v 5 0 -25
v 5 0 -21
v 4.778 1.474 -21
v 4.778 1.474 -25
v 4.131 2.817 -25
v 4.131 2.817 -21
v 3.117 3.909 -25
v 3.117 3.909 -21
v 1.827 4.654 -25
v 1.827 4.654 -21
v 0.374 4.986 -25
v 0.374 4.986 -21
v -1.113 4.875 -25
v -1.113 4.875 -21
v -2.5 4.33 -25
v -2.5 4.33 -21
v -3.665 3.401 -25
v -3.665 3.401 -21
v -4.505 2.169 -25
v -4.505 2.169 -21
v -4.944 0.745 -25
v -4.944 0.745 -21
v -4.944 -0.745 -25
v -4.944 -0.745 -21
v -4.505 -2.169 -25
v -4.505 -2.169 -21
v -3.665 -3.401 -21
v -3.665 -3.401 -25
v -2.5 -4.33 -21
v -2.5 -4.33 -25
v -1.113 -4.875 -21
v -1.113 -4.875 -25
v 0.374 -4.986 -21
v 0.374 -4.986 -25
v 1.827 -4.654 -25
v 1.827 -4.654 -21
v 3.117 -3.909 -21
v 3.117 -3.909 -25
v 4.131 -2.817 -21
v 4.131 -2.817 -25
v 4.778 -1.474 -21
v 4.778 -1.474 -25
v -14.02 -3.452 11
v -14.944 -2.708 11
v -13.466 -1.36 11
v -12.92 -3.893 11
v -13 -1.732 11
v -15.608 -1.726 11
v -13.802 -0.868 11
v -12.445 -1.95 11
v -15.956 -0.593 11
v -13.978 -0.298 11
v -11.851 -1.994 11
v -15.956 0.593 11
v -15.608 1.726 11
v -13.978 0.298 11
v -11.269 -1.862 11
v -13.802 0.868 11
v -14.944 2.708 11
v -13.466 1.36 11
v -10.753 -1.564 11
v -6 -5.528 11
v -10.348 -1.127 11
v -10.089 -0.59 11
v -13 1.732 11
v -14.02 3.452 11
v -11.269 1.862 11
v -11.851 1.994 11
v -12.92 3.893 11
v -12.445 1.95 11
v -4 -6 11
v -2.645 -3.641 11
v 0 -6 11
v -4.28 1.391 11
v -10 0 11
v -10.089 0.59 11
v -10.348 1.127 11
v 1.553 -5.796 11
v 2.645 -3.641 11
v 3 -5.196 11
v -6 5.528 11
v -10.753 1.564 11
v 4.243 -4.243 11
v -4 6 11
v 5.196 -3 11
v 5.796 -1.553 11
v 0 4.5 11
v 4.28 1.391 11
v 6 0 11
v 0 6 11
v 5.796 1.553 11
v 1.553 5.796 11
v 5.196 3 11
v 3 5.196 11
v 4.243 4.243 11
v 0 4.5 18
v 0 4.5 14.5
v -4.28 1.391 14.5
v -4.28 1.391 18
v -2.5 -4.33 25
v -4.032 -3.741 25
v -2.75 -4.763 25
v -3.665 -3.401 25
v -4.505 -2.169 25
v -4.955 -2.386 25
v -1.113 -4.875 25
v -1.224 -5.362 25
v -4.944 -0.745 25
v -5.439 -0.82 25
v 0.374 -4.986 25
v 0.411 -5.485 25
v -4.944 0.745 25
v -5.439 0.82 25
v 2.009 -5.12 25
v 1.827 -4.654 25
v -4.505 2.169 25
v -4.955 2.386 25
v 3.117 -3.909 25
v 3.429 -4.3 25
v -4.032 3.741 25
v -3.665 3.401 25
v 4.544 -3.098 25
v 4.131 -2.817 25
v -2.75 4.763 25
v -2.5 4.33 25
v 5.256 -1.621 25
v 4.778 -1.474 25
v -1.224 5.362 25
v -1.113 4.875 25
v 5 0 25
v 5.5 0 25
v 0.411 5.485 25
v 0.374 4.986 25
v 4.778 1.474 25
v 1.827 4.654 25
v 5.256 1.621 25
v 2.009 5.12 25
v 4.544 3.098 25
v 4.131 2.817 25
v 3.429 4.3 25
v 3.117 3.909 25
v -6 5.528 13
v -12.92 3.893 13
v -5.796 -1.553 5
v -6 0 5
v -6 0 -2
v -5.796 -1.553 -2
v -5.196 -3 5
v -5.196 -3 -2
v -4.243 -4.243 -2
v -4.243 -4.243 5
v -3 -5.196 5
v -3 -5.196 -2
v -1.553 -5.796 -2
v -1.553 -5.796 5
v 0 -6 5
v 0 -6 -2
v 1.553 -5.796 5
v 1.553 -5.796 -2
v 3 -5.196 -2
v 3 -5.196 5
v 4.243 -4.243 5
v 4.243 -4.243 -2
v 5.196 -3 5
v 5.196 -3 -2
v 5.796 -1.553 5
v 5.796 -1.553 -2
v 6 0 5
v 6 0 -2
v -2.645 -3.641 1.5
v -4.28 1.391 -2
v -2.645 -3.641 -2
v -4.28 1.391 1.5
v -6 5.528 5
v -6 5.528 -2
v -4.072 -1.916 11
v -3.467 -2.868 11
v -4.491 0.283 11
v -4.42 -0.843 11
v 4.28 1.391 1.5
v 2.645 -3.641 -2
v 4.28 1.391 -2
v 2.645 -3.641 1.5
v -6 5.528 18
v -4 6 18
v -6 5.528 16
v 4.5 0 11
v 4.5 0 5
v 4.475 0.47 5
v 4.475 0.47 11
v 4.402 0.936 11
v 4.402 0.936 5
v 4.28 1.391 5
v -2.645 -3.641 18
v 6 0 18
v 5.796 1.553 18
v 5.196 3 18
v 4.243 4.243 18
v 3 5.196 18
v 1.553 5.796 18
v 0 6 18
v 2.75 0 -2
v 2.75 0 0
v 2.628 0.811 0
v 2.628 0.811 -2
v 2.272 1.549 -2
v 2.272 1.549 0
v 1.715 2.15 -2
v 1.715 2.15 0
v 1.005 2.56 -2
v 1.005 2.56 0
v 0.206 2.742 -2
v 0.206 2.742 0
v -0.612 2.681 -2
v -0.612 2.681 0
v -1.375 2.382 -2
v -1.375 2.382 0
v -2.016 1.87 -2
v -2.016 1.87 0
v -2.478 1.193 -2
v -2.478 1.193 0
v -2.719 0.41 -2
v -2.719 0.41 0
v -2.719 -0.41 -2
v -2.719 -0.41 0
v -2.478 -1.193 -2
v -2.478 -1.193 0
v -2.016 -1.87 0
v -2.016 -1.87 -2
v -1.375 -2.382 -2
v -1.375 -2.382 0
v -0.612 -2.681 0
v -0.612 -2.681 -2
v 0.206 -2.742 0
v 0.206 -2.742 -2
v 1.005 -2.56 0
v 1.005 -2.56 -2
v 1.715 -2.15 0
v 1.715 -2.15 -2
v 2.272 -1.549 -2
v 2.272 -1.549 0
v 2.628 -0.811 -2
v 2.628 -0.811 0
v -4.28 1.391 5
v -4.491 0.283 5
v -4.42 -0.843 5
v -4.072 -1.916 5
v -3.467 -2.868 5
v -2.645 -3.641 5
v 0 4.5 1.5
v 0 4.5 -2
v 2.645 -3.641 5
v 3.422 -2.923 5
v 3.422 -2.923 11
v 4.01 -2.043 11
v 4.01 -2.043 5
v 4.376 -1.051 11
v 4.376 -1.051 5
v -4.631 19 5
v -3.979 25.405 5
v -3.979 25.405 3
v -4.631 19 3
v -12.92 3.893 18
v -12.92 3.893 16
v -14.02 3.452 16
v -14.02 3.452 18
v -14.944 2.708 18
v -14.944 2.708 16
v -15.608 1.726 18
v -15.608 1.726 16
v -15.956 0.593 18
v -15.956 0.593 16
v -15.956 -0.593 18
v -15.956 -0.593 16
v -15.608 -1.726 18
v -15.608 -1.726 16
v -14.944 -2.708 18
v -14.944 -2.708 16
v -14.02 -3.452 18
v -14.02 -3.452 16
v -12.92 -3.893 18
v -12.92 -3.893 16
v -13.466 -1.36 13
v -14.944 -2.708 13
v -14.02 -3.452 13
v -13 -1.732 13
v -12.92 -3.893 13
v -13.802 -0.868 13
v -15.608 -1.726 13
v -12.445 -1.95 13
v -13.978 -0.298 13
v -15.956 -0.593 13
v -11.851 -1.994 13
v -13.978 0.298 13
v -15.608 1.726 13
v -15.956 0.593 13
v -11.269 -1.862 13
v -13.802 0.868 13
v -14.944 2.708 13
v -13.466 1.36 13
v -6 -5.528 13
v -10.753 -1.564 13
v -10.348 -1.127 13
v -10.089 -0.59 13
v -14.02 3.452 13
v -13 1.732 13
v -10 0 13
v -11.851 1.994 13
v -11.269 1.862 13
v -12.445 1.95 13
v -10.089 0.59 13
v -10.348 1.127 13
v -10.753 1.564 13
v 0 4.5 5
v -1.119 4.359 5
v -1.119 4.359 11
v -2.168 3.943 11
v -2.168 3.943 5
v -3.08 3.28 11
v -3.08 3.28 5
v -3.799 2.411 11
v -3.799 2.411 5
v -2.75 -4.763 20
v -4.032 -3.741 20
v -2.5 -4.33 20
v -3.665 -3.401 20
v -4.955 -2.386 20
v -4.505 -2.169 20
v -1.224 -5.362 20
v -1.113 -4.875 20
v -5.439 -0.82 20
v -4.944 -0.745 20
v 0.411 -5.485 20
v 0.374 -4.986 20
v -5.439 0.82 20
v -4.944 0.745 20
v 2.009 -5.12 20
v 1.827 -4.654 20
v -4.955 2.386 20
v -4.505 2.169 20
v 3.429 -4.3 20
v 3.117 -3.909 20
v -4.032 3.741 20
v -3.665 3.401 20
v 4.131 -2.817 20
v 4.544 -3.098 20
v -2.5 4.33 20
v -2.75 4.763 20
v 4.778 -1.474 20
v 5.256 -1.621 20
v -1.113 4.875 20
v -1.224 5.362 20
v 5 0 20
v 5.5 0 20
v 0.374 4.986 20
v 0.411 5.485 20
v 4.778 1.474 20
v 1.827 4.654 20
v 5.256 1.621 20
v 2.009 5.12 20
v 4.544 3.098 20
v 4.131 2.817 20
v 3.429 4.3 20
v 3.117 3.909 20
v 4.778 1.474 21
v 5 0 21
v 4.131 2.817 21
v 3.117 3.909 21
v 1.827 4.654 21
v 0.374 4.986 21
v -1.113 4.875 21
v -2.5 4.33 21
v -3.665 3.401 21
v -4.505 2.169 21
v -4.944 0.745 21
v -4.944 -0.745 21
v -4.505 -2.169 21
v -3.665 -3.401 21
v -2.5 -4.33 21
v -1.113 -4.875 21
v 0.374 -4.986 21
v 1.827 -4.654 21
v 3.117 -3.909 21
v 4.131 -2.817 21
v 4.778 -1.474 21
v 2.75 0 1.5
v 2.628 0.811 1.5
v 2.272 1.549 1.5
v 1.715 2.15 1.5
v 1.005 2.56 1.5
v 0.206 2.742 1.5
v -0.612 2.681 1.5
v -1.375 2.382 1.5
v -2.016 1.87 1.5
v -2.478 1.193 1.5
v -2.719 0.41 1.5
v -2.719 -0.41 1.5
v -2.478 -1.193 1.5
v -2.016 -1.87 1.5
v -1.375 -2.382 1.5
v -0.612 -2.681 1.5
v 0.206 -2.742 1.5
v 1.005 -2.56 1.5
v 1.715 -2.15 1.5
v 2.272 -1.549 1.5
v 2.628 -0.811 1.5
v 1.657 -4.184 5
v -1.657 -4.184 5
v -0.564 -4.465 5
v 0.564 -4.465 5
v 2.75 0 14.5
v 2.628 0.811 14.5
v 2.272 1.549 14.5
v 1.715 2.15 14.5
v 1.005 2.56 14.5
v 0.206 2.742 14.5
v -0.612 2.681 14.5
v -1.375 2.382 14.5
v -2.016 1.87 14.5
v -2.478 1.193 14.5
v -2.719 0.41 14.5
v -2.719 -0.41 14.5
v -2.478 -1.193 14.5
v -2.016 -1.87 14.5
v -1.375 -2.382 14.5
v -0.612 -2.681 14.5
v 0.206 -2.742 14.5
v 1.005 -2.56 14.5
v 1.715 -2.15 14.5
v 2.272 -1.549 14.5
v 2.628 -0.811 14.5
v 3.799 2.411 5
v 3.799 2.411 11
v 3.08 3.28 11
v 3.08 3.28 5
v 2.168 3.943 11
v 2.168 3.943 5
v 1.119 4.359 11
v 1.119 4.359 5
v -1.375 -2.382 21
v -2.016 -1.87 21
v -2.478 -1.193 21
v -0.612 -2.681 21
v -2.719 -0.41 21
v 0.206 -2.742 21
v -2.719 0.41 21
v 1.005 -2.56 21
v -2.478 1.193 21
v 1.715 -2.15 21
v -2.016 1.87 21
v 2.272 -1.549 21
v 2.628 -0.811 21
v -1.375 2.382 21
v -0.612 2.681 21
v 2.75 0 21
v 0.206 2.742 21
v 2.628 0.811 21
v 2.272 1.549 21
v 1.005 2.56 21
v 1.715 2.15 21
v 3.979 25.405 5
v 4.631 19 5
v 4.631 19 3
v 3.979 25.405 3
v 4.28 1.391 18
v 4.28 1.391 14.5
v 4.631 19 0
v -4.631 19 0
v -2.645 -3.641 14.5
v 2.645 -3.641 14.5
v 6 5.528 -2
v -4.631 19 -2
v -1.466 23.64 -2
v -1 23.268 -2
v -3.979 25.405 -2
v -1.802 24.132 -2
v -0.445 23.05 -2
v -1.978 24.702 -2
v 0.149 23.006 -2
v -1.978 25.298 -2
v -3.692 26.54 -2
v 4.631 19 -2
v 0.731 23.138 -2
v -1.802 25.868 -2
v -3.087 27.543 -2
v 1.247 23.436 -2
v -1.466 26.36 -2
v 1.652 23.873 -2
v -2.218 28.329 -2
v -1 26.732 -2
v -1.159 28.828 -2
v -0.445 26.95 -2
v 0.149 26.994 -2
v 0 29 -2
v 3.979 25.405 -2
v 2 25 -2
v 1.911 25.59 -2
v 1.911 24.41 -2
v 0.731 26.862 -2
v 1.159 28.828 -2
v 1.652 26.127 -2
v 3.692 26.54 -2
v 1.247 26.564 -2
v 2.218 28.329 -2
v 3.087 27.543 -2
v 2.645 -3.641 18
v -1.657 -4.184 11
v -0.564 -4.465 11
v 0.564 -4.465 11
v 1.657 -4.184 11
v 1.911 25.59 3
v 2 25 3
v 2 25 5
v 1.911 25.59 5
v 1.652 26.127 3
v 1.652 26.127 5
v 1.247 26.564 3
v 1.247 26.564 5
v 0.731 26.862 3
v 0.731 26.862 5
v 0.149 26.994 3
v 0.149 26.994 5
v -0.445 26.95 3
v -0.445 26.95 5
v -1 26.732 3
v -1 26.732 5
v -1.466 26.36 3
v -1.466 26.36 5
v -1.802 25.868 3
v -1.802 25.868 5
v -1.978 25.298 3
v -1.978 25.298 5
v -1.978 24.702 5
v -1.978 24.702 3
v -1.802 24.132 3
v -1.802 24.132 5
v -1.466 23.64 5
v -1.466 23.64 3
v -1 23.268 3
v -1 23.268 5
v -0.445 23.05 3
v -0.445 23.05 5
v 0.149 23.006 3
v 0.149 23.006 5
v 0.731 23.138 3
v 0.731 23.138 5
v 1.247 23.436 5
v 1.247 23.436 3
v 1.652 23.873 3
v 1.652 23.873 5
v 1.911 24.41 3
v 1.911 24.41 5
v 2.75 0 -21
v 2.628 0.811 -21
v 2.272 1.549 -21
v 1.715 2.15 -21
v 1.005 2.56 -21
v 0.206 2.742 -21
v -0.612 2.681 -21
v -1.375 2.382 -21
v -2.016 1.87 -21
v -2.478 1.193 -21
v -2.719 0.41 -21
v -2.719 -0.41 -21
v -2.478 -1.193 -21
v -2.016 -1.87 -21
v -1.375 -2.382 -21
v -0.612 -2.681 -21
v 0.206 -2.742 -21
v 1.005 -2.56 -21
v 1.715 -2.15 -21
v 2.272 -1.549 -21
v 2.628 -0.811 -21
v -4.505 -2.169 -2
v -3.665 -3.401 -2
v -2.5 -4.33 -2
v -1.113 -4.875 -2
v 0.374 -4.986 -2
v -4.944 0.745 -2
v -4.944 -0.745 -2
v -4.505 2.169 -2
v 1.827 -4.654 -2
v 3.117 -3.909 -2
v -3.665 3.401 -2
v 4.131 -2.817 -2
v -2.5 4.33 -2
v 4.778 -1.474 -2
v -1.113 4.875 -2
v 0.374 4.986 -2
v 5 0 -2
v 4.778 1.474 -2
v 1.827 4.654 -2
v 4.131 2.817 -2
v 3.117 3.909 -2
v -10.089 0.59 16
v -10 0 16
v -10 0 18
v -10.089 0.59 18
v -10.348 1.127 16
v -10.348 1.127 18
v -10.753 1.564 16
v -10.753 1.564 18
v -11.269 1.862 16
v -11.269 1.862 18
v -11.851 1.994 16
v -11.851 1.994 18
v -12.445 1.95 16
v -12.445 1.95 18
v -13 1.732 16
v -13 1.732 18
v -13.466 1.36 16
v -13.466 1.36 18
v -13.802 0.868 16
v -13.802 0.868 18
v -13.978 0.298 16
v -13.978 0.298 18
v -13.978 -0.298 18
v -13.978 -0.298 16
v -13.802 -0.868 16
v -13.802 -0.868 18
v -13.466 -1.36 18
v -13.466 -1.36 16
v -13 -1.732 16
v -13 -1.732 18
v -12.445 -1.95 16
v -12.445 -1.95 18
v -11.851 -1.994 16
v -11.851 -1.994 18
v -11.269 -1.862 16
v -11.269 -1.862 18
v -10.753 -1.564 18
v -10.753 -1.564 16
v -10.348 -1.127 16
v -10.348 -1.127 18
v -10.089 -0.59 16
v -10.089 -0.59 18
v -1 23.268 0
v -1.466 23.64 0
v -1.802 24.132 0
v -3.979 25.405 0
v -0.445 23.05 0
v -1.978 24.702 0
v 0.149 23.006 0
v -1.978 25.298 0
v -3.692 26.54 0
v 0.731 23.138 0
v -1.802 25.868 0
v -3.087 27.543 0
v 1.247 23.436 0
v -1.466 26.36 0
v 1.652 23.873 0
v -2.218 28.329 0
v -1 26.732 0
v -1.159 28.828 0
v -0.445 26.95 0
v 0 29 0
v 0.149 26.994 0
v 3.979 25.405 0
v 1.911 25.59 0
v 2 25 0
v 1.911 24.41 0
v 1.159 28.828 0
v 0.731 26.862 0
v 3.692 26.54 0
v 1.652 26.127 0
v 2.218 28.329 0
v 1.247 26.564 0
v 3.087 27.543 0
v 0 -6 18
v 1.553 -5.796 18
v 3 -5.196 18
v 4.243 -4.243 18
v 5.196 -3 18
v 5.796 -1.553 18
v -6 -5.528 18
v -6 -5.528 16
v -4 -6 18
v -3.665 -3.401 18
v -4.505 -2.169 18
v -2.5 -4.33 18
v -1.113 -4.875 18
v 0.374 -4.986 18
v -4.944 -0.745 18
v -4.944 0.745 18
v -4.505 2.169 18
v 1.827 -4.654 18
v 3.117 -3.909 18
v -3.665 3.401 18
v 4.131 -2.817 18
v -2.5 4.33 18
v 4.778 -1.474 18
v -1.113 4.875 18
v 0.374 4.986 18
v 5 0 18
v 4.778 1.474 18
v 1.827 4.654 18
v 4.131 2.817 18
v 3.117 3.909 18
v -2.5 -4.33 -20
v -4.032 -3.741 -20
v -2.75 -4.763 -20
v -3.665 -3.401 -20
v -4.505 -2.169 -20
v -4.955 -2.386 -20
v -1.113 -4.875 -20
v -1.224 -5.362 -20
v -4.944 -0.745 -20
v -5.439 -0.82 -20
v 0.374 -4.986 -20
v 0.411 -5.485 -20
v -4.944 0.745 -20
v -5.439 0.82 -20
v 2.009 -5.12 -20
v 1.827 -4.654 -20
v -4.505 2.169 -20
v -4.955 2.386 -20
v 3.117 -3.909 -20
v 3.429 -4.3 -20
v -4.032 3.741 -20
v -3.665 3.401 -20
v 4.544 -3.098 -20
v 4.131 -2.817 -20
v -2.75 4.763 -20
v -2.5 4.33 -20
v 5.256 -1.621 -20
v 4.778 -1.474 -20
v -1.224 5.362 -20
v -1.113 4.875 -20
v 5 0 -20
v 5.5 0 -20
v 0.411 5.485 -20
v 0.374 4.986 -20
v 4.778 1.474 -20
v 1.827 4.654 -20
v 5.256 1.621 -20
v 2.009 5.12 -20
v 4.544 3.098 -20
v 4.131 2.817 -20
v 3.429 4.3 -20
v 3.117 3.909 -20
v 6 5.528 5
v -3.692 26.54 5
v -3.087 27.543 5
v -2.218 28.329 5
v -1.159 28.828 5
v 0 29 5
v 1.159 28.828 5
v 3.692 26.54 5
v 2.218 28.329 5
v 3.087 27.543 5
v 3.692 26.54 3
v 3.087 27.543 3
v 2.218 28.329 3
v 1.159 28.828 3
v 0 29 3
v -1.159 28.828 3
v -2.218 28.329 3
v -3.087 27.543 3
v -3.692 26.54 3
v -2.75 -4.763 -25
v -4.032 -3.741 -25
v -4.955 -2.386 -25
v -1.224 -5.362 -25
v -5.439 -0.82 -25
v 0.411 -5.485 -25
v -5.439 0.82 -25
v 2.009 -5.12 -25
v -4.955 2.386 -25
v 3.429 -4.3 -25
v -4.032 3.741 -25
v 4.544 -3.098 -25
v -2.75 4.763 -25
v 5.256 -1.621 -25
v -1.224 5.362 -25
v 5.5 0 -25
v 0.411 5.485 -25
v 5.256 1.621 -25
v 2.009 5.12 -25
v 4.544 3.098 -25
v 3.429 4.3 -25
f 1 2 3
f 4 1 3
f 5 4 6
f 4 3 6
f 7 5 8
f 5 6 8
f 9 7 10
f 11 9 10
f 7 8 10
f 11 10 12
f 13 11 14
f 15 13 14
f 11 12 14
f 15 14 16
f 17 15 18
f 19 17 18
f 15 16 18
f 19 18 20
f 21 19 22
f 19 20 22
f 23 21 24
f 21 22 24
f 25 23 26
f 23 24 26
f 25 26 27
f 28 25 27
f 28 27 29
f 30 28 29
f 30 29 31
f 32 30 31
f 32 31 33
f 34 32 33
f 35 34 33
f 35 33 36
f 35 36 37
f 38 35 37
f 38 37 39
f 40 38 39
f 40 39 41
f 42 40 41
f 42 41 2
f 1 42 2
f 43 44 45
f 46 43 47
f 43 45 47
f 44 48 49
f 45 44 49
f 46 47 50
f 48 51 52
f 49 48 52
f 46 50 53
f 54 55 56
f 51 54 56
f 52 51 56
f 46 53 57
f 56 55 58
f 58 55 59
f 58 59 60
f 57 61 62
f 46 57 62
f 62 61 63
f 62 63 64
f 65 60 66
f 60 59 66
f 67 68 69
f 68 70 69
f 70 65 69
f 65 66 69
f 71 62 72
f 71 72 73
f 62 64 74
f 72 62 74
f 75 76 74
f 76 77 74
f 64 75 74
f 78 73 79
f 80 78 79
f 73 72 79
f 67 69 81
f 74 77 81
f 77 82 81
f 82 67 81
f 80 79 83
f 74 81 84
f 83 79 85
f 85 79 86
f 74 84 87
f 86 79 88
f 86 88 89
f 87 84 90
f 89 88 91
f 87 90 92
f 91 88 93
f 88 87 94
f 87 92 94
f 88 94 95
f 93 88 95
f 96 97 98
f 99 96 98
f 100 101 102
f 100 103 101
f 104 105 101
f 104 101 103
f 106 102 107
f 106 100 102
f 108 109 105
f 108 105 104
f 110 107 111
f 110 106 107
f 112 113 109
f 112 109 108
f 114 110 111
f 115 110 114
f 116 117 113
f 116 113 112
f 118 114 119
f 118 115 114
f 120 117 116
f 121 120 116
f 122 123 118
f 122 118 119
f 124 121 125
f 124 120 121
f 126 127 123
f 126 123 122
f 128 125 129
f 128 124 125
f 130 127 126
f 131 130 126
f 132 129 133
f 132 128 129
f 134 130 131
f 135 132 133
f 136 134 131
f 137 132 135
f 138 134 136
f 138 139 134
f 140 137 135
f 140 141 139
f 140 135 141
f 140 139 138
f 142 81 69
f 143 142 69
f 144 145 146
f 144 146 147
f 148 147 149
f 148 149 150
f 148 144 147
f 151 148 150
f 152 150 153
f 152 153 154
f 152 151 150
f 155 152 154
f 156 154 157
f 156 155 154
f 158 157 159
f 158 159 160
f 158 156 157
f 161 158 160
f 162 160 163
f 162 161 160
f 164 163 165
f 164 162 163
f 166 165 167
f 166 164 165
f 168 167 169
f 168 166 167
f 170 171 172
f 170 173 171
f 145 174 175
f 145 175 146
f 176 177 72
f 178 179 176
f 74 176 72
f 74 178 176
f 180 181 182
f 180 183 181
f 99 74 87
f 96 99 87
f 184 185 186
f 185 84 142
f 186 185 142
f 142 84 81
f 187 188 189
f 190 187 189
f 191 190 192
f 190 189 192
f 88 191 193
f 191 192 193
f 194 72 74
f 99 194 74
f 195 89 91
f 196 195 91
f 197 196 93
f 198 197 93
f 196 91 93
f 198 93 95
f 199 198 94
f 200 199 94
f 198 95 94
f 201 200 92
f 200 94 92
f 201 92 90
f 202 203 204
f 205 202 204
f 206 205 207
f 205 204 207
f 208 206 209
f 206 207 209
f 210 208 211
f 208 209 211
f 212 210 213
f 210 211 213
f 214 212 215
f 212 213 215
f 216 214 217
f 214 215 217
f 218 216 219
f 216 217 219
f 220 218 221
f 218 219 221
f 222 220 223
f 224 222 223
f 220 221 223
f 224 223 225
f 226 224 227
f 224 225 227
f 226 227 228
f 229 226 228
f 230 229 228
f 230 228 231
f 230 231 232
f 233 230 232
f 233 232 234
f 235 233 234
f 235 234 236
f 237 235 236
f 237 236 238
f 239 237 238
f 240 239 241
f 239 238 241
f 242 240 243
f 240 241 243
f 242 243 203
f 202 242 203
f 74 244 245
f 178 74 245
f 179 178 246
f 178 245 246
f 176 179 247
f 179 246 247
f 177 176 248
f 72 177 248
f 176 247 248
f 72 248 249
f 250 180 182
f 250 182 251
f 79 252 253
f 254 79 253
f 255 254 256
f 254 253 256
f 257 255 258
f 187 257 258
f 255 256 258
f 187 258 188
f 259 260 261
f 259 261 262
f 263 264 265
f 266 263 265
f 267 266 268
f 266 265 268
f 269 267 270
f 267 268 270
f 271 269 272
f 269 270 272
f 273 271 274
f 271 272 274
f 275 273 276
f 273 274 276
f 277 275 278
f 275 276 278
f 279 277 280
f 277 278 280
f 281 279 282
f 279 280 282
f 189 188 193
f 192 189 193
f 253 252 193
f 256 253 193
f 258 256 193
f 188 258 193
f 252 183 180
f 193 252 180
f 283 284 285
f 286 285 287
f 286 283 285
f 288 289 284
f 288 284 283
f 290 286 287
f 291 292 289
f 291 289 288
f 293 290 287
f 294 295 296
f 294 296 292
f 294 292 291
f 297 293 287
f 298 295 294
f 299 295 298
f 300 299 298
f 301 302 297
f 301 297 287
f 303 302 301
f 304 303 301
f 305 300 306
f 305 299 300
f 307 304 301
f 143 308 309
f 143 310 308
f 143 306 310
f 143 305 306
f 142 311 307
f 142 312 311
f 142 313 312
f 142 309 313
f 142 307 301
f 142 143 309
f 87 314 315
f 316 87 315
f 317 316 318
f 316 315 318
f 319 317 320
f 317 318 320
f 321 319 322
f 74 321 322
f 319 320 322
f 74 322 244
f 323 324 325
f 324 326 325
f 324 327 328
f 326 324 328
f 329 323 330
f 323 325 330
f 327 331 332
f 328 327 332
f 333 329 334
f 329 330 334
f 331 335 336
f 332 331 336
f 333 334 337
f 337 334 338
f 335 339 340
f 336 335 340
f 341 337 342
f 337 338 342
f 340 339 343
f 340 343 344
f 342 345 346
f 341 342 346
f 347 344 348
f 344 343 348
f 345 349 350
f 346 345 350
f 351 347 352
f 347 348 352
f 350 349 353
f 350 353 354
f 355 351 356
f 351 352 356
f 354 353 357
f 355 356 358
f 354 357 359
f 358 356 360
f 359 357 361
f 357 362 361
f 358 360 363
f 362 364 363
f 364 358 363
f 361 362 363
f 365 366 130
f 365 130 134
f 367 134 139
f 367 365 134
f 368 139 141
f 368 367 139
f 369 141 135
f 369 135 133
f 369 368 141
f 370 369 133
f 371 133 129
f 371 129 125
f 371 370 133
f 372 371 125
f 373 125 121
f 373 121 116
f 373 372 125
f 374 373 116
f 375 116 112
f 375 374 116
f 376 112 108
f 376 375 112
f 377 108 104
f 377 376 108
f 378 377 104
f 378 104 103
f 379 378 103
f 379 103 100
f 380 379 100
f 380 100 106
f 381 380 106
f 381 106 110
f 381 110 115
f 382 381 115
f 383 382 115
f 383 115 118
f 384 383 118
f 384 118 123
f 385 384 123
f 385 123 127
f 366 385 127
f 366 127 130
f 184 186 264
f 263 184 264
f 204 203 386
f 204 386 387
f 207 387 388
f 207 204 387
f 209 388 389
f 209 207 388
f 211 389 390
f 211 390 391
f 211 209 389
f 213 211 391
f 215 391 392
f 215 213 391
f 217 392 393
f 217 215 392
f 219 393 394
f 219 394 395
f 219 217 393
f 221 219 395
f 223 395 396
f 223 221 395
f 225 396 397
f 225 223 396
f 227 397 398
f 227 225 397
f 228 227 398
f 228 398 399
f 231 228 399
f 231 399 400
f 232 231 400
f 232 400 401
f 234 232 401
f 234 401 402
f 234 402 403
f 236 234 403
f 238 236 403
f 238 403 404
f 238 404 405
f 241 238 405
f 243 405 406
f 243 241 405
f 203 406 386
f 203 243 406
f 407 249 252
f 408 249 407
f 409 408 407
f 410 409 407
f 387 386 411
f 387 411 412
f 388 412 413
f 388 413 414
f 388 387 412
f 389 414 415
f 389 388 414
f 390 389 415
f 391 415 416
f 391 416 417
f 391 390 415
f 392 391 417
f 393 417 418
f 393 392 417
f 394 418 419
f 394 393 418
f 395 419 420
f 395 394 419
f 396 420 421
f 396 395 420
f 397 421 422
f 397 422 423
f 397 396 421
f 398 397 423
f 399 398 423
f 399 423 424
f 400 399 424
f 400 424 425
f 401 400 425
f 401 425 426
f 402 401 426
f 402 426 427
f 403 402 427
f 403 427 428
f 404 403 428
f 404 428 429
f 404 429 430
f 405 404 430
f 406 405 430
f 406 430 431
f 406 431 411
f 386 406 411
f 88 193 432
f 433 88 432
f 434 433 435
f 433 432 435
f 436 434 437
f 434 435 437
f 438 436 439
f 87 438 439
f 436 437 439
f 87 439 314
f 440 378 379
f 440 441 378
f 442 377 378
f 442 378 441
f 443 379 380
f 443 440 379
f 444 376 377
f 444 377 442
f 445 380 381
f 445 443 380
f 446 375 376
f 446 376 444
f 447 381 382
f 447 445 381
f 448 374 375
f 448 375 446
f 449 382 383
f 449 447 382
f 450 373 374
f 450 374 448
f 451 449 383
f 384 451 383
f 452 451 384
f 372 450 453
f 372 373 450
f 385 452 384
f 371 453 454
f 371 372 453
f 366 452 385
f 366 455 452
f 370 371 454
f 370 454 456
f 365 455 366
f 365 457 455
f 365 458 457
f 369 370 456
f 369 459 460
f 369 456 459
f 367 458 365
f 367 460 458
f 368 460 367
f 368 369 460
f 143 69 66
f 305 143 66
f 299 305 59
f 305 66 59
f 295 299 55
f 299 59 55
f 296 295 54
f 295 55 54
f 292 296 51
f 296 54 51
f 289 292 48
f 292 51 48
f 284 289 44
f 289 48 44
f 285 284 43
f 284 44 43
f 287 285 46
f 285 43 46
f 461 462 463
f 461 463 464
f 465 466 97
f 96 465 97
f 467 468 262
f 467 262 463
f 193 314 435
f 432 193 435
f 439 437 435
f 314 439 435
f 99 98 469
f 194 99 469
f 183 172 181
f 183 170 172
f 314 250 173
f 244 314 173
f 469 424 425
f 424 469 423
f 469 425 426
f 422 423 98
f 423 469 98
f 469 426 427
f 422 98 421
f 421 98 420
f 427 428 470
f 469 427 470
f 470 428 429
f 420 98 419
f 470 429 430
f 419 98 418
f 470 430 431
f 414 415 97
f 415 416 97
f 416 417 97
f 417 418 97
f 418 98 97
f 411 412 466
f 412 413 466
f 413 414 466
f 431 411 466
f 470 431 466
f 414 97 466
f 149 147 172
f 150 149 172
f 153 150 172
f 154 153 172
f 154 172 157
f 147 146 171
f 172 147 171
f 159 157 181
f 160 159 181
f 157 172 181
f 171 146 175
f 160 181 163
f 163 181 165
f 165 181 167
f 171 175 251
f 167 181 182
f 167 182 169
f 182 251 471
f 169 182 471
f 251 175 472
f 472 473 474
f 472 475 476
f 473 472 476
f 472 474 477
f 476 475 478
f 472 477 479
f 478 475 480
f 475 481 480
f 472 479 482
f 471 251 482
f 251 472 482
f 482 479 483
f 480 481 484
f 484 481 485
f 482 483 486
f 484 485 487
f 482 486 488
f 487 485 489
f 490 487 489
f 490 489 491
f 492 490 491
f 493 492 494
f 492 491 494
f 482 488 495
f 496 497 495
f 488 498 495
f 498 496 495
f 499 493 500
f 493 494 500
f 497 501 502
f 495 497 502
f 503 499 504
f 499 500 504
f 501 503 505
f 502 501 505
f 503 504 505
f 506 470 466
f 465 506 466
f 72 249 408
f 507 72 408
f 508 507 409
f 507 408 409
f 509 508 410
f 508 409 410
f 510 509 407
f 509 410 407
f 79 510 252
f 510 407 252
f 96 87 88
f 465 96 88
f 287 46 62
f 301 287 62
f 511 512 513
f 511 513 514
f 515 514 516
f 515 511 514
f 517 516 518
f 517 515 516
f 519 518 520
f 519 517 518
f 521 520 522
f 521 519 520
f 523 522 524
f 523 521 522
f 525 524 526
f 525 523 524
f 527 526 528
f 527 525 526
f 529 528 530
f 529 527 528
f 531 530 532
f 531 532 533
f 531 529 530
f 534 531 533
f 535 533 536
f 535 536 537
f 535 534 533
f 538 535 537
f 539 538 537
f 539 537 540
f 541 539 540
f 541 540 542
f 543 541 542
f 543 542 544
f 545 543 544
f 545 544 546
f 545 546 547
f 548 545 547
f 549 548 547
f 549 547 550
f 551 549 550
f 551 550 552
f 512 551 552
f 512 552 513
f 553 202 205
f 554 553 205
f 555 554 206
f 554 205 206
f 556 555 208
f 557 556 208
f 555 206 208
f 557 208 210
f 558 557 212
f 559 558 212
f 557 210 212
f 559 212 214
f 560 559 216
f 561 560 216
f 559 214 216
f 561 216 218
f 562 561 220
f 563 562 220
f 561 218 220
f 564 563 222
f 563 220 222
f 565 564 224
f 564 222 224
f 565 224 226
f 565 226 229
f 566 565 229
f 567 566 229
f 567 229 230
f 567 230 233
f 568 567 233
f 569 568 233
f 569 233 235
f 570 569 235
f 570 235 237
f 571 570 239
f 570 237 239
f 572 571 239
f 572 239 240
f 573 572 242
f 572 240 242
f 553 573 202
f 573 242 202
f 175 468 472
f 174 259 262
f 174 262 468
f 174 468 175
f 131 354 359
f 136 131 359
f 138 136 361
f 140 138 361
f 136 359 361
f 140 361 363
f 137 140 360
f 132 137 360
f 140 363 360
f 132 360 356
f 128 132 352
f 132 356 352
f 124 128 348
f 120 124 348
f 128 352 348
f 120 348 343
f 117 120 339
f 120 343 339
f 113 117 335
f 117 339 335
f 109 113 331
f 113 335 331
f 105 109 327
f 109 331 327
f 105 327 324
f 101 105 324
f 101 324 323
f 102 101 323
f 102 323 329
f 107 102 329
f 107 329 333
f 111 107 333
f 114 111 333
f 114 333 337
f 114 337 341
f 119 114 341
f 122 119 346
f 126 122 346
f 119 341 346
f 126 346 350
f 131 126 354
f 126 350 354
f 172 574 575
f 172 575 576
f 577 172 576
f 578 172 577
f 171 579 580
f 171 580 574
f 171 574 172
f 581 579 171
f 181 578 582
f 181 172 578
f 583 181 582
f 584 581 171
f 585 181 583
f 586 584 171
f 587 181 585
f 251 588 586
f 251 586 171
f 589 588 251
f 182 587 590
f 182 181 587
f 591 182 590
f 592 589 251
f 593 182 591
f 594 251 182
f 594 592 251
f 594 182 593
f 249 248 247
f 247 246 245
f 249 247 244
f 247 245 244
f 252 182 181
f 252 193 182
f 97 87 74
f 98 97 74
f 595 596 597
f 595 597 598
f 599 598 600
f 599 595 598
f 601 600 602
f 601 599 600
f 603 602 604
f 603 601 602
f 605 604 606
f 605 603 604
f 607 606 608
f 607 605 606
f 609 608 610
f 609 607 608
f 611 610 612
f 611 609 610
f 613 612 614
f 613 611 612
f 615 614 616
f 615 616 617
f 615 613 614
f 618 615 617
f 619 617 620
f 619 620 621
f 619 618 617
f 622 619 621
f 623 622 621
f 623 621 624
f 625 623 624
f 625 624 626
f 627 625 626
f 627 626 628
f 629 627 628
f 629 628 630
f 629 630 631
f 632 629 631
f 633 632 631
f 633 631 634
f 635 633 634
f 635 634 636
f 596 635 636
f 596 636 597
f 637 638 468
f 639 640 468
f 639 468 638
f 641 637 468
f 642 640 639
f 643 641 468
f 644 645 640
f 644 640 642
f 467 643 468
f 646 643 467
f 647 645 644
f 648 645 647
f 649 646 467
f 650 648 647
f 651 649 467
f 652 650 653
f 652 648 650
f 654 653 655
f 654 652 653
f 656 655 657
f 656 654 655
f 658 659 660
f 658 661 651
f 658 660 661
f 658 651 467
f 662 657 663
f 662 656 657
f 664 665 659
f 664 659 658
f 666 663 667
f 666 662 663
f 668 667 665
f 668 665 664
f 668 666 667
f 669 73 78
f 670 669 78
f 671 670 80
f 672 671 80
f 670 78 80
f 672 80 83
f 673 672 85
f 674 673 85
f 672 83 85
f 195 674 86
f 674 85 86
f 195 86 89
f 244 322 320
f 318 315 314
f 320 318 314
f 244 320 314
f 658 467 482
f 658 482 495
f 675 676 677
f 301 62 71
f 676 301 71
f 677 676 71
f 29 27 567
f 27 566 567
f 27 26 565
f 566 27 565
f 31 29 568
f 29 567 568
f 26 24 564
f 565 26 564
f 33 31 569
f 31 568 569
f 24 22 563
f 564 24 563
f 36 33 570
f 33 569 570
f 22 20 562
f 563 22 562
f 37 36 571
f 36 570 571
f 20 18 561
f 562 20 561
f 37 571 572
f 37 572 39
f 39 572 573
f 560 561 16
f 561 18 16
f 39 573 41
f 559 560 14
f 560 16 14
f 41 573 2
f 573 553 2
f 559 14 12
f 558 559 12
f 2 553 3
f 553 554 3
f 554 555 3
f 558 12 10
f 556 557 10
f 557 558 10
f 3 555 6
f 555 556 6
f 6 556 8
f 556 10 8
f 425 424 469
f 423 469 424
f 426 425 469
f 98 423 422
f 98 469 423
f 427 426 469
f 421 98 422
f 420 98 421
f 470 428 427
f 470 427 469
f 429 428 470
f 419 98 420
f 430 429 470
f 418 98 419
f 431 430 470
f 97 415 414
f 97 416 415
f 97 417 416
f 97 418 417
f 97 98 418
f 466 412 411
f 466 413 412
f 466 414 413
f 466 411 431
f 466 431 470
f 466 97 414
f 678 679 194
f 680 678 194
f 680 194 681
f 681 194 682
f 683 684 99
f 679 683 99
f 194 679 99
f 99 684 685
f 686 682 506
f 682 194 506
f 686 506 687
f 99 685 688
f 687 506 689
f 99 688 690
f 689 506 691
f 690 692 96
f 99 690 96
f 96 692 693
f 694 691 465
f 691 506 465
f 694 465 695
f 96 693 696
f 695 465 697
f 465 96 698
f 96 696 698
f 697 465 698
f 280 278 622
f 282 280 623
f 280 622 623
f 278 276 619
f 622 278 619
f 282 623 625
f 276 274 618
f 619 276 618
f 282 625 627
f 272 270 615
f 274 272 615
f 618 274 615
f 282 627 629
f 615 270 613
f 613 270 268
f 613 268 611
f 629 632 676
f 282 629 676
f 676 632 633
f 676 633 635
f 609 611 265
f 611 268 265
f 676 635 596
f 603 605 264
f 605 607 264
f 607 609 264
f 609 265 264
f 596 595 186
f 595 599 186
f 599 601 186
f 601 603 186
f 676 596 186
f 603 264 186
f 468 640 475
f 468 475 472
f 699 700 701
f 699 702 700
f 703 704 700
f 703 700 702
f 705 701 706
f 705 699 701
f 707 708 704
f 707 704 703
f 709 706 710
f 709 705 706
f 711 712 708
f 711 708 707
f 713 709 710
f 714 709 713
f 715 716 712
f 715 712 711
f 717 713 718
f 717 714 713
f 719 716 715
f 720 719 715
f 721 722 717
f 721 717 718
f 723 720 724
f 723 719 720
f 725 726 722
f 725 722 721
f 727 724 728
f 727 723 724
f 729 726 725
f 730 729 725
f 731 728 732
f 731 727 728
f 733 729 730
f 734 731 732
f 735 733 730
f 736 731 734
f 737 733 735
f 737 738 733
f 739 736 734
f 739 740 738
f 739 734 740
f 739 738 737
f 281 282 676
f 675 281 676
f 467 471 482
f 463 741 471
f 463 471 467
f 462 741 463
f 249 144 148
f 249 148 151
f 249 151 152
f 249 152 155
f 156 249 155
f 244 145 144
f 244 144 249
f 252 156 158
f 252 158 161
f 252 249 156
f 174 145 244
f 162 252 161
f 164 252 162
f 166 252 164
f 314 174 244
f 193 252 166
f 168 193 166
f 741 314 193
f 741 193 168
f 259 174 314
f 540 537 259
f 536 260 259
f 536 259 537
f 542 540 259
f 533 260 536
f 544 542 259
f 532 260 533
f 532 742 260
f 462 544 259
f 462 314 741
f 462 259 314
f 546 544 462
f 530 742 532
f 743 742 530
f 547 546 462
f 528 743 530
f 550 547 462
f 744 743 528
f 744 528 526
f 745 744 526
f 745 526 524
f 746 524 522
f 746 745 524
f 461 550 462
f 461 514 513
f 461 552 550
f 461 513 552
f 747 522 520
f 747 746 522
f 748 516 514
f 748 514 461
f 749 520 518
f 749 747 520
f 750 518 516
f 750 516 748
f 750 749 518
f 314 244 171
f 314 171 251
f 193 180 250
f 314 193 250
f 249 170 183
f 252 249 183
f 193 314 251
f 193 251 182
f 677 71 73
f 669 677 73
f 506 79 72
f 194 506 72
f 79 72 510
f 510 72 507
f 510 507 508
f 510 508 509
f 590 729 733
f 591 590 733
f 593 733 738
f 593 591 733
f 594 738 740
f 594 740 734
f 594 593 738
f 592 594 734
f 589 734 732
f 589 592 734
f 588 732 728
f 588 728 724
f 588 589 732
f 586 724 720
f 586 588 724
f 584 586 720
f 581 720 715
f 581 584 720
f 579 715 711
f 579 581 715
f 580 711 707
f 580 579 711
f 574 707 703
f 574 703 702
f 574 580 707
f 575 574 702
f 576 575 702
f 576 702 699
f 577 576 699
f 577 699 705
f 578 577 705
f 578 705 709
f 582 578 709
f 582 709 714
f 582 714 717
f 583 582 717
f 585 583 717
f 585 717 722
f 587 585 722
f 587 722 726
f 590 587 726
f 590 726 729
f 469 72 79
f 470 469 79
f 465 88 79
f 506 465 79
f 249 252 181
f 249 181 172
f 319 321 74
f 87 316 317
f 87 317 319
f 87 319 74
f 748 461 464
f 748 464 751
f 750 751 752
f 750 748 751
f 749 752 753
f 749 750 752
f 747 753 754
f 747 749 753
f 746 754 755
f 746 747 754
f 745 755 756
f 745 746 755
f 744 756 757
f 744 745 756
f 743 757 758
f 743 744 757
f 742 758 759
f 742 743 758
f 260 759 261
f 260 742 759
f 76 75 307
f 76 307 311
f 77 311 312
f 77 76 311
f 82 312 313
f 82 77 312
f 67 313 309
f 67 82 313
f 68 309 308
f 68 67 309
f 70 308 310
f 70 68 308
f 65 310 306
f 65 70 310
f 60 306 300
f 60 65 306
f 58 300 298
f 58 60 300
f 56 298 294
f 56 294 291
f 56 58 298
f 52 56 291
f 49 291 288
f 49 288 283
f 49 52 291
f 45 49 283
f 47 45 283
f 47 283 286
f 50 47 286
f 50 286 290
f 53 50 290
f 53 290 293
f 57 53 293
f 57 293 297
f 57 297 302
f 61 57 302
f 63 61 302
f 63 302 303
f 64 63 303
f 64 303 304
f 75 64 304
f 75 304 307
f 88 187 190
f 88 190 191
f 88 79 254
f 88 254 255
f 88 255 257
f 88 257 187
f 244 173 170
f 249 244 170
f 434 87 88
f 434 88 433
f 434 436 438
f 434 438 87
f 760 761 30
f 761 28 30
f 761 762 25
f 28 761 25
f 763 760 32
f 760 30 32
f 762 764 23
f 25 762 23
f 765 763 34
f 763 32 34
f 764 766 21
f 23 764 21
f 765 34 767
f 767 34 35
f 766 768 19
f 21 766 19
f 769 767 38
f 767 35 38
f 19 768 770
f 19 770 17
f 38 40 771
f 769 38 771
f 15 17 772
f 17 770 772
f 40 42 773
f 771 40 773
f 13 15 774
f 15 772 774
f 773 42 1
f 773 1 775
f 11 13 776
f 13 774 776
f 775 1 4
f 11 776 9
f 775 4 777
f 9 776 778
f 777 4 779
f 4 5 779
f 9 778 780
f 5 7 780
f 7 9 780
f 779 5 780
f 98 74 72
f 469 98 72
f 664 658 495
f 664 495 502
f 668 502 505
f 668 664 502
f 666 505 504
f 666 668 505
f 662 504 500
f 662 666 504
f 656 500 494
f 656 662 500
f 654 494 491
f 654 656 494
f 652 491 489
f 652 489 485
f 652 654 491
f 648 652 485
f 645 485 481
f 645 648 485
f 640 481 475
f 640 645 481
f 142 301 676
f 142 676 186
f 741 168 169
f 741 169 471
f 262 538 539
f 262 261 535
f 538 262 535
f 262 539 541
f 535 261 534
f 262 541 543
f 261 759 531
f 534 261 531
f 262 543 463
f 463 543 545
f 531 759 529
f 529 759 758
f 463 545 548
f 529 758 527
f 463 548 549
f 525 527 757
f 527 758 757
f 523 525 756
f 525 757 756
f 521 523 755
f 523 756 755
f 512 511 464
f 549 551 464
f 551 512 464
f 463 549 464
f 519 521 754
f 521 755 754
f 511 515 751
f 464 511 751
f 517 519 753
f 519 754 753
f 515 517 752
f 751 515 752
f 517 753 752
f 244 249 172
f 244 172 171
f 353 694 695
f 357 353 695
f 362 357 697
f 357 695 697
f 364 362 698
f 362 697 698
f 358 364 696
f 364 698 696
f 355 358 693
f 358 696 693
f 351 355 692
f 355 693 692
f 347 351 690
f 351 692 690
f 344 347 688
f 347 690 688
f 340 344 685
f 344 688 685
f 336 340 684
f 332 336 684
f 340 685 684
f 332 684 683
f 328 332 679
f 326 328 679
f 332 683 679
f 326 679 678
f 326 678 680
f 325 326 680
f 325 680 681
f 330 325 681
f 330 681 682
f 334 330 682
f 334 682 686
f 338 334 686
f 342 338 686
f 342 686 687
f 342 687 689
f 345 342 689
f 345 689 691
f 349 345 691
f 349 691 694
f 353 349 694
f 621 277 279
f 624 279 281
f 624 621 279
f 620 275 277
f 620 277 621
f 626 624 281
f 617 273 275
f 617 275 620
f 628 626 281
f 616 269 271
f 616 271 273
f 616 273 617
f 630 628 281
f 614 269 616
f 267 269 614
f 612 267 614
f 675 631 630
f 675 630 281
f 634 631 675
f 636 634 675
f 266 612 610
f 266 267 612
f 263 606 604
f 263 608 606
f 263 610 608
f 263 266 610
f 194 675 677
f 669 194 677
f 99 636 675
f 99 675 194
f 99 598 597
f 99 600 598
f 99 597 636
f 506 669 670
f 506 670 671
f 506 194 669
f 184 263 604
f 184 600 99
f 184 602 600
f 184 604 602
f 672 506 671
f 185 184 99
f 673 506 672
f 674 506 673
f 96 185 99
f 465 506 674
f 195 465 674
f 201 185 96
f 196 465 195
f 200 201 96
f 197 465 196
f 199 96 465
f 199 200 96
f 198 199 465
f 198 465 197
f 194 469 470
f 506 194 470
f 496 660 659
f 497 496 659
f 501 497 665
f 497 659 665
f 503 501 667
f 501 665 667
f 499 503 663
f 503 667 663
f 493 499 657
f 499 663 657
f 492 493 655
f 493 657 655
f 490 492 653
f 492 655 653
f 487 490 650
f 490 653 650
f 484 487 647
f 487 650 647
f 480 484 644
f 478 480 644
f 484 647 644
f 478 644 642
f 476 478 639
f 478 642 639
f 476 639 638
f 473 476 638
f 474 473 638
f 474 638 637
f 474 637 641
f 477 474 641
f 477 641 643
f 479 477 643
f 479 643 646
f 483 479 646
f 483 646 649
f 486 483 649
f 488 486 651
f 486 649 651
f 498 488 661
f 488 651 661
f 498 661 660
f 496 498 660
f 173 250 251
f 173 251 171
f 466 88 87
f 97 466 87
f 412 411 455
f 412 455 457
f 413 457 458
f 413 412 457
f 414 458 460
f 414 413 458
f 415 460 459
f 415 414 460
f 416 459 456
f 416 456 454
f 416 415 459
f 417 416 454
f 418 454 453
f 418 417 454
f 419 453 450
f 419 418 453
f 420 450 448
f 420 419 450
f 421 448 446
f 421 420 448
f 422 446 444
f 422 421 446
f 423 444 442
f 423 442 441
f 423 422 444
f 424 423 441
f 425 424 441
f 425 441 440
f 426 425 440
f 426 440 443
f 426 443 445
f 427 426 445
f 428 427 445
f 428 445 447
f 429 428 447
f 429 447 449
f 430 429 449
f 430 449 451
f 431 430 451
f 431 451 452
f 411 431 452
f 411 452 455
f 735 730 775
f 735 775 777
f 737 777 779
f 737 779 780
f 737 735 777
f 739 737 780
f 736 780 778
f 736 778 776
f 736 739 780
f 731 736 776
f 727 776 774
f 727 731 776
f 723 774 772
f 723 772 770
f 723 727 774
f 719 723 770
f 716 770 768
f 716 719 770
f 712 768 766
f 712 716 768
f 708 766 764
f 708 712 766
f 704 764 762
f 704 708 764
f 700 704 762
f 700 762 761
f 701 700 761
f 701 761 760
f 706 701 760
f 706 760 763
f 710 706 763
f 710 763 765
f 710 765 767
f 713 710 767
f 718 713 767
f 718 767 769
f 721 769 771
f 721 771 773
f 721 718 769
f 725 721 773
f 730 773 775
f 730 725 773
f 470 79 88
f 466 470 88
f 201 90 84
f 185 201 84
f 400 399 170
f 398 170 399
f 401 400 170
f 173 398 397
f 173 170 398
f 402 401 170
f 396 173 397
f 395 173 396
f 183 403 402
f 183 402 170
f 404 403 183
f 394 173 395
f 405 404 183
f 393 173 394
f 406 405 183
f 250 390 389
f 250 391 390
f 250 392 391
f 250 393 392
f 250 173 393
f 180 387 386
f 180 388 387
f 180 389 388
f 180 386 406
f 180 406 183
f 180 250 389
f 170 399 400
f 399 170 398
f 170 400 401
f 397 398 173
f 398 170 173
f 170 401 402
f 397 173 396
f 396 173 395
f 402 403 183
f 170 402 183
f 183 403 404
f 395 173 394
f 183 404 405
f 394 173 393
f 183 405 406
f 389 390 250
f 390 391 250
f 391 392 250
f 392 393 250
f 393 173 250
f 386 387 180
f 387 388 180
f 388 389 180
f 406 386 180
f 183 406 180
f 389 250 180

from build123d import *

# Parameters (mm, degrees)
F1_START       = 20
F0_R           = 5.5
F0_R_2         = 5
F1_DEPTH       = 5
F2_START       = 18
F0_R_3         = 2.75
F2_DEPTH       = 3
F3_START       = 14.5
F3_DEPTH       = 3.5
F4_START       = 11
F0_R_4         = 2
F4_DEPTH       = 7
F5_START       = 13
F5_DEPTH       = 3
F6_START       = 11
F6_DEPTH       = 3.5
F7_START       = 5
F7_DEPTH       = 6
F8_START       = 1.5
F8_DEPTH       = 3.5
F9_DEPTH       = 5
F9_DEPTH_BACK  = 2
F10_DEPTH      = 3
F11_DEPTH      = 1.5
F11_DEPTH_BACK = 2
F12_START      = -2
F12_DEPTH      = 19
F13_START      = -20
F13_DEPTH      = 5


# Not quite as in the source:
# - a feature names something its author has since deleted; it is built from what else it names


with BuildPart() as f1:
    # F0 (on Top) → F1 (new body)
    with BuildSketch(Plane.XY.offset(F1_START)):
        Circle(F0_R)
        Circle(F0_R_2, mode=Mode.SUBTRACT)
    extrude(amount=F1_DEPTH)

    # F0 (on Top) → F2 (join)
    with BuildSketch(Plane.XY.offset(F2_START)):
        Circle(F0_R_2)
        with BuildLine():
            ThreePointArc((4.2797543233, 1.3905764747), (4.4445975327, 0.7039550927), (4.5, 0))
            ThreePointArc((4.5, 0), (4.0095293588, -2.0429572488), (2.6450336353, -3.6405764747))
            ThreePointArc((2.6450336353, -3.6405764747), (0, -4.5), (-2.6450336353, -3.6405764747))
            ThreePointArc((-2.6450336353, -3.6405764747), (-4.2797543233, -1.3905764747), (-4.2797543233, 1.3905764747))
            ThreePointArc((-4.2797543233, 1.3905764747), (-2.6450336353, 3.6405764747), (0, 4.5))
            ThreePointArc((0, 4.5), (2.6450336353, 3.6405764747), (4.2797543233, 1.3905764747))
        make_face(mode=Mode.SUBTRACT)
        Polygon((2.6450336353, -3.6405764747), (4.2797543233, 1.3905764747), (0, 4.5), (-4.2797543233, 1.3905764747), (-2.6450336353, -3.6405764747), align=None)
        Circle(F0_R_3, mode=Mode.SUBTRACT)
        with BuildLine():
            Line((-4.2797543233, 1.3905764747), (0, 4.5))
            ThreePointArc((0, 4.5), (-2.6450336353, 3.6405764747), (-4.2797543233, 1.3905764747))
        make_face()
        with BuildLine():
            Line((0, 4.5), (4.2797543233, 1.3905764747))
            ThreePointArc((4.2797543233, 1.3905764747), (2.6450336353, 3.6405764747), (0, 4.5))
        make_face()
        with BuildLine():
            ThreePointArc((2.6450336353, -3.6405764747), (4.0095293588, -2.0429572488), (4.5, 0))
            ThreePointArc((4.5, 0), (4.4445975327, 0.7039550927), (4.2797543233, 1.3905764747))
            Line((4.2797543233, 1.3905764747), (2.6450336353, -3.6405764747))
        make_face()
        with BuildLine():
            ThreePointArc((-4.2797543233, 1.3905764747), (-4.2797543233, -1.3905764747), (-2.6450336353, -3.6405764747))
            Line((-2.6450336353, -3.6405764747), (-4.2797543233, 1.3905764747))
        make_face()
        with BuildLine():
            ThreePointArc((-2.6450336353, -3.6405764747), (0, -4.5), (2.6450336353, -3.6405764747))
            Line((2.6450336353, -3.6405764747), (-2.6450336353, -3.6405764747))
        make_face()
    extrude(amount=F2_DEPTH)

    # F0 (on Top) → F3 (join)
    with BuildSketch(Plane.XY.offset(F3_START)):
        Polygon((2.6450336353, -3.6405764747), (4.2797543233, 1.3905764747), (0, 4.5), (-4.2797543233, 1.3905764747), (-2.6450336353, -3.6405764747), align=None)
        Circle(F0_R_3, mode=Mode.SUBTRACT)
    extrude(amount=F3_DEPTH)


with BuildPart() as f4:
    # F0 (on Top) → F4 (new body)
    with BuildSketch(Plane.XY.offset(F4_START)):
        with BuildLine():
            ThreePointArc((6, 0), (4.2426406871, 4.2426406871), (0, 6))
            ThreePointArc((0, 6), (-4.2426406871, 4.2426406871), (-6, 0))
            ThreePointArc((-6, 0), (-4.2426406871, -4.2426406871), (0, -6))
            ThreePointArc((0, -6), (4.2426406871, -4.2426406871), (6, 0))
        make_face()
        Circle(F0_R, mode=Mode.SUBTRACT)
        Circle(F0_R)
        Circle(F0_R_2, mode=Mode.SUBTRACT)
        with BuildLine():
            Line((-6, -5.5275252317), (-6, 0))
            Line((-6, 0), (-6, 5.5275252317))
            Line((-6, 5.5275252317), (-12.9196363336, 3.8928484448))
            ThreePointArc((-12.9196363336, 3.8928484448), (-16, 0), (-12.9196363336, -3.8928484448))
            Line((-12.9196363336, -3.8928484448), (-6, -5.5275252317))
        make_face()
        with Locations((-12, 0)):
            Circle(F0_R_4, mode=Mode.SUBTRACT)
        Circle(F0_R_2)
        with BuildLine():
            ThreePointArc((4.2797543233, 1.3905764747), (4.4445975327, 0.7039550927), (4.5, 0))
            ThreePointArc((4.5, 0), (4.0095293588, -2.0429572488), (2.6450336353, -3.6405764747))
            ThreePointArc((2.6450336353, -3.6405764747), (0, -4.5), (-2.6450336353, -3.6405764747))
            ThreePointArc((-2.6450336353, -3.6405764747), (-4.2797543233, -1.3905764747), (-4.2797543233, 1.3905764747))
            ThreePointArc((-4.2797543233, 1.3905764747), (-2.6450336353, 3.6405764747), (0, 4.5))
            ThreePointArc((0, 4.5), (2.6450336353, 3.6405764747), (4.2797543233, 1.3905764747))
        make_face(mode=Mode.SUBTRACT)
        with BuildLine():
            ThreePointArc((-6, 0), (-4.2426406871, 4.2426406871), (0, 6))
            Line((0, 6), (-4, 6))
            Line((-4, 6), (-6, 5.5275252317))
            Line((-6, 5.5275252317), (-6, 0))
        make_face()
        with BuildLine():
            ThreePointArc((0, -6), (-4.2426406871, -4.2426406871), (-6, 0))
            Line((-6, 0), (-6, -5.5275252317))
            Line((-6, -5.5275252317), (-4, -6))
            Line((-4, -6), (0, -6))
        make_face()
        with BuildLine():
            ThreePointArc((-4.2797543233, 1.3905764747), (-4.2797543233, -1.3905764747), (-2.6450336353, -3.6405764747))
            Line((-2.6450336353, -3.6405764747), (-4.2797543233, 1.3905764747))
        make_face()
        with BuildLine():
            ThreePointArc((2.6450336353, -3.6405764747), (4.0095293588, -2.0429572488), (4.5, 0))
            ThreePointArc((4.5, 0), (4.4445975327, 0.7039550927), (4.2797543233, 1.3905764747))
            Line((4.2797543233, 1.3905764747), (2.6450336353, -3.6405764747))
        make_face()
        with BuildLine():
            ThreePointArc((-2.6450336353, -3.6405764747), (0, -4.5), (2.6450336353, -3.6405764747))
            Line((2.6450336353, -3.6405764747), (-2.6450336353, -3.6405764747))
        make_face()
        with BuildLine():
            Line((0, 4.5), (4.2797543233, 1.3905764747))
            ThreePointArc((4.2797543233, 1.3905764747), (2.6450336353, 3.6405764747), (0, 4.5))
        make_face()
        with BuildLine():
            Line((-4.2797543233, 1.3905764747), (0, 4.5))
            ThreePointArc((0, 4.5), (-2.6450336353, 3.6405764747), (-4.2797543233, 1.3905764747))
        make_face()
    extrude(amount=F4_DEPTH)

    # F0 (on Top) → F5 (cut)
    with BuildSketch(Plane.XY.offset(F5_START)):
        with BuildLine():
            Line((-6, -5.5275252317), (-6, 0))
            Line((-6, 0), (-6, 5.5275252317))
            Line((-6, 5.5275252317), (-12.9196363336, 3.8928484448))
            ThreePointArc((-12.9196363336, 3.8928484448), (-16, 0), (-12.9196363336, -3.8928484448))
            Line((-12.9196363336, -3.8928484448), (-6, -5.5275252317))
        make_face()
        with Locations((-12, 0)):
            Circle(F0_R_4, mode=Mode.SUBTRACT)
    extrude(amount=F5_DEPTH, mode=Mode.SUBTRACT)


with BuildPart() as f6:
    # F0 (on Top) → F6 (new body)
    with BuildSketch(Plane.XY.offset(F6_START)):
        Polygon((2.6450336353, -3.6405764747), (4.2797543233, 1.3905764747), (0, 4.5), (-4.2797543233, 1.3905764747), (-2.6450336353, -3.6405764747), align=None)
        Circle(F0_R_3, mode=Mode.SUBTRACT)
    extrude(amount=F6_DEPTH)

    # F0 (on Top) → F7 (join)
    with BuildSketch(Plane.XY.offset(F7_START)):
        with BuildLine():
            Line((0, 4.5), (4.2797543233, 1.3905764747))
            ThreePointArc((4.2797543233, 1.3905764747), (2.6450336353, 3.6405764747), (0, 4.5))
        make_face()
        Polygon((2.6450336353, -3.6405764747), (4.2797543233, 1.3905764747), (0, 4.5), (-4.2797543233, 1.3905764747), (-2.6450336353, -3.6405764747), align=None)
        Circle(F0_R_3, mode=Mode.SUBTRACT)
        with BuildLine():
            ThreePointArc((2.6450336353, -3.6405764747), (4.0095293588, -2.0429572488), (4.5, 0))
            ThreePointArc((4.5, 0), (4.4445975327, 0.7039550927), (4.2797543233, 1.3905764747))
            Line((4.2797543233, 1.3905764747), (2.6450336353, -3.6405764747))
        make_face()
        with BuildLine():
            Line((-4.2797543233, 1.3905764747), (0, 4.5))
            ThreePointArc((0, 4.5), (-2.6450336353, 3.6405764747), (-4.2797543233, 1.3905764747))
        make_face()
        with BuildLine():
            ThreePointArc((-2.6450336353, -3.6405764747), (0, -4.5), (2.6450336353, -3.6405764747))
            Line((2.6450336353, -3.6405764747), (-2.6450336353, -3.6405764747))
        make_face()
        with BuildLine():
            ThreePointArc((-4.2797543233, 1.3905764747), (-4.2797543233, -1.3905764747), (-2.6450336353, -3.6405764747))
            Line((-2.6450336353, -3.6405764747), (-4.2797543233, 1.3905764747))
        make_face()
    extrude(amount=F7_DEPTH)

    # F0 (on Top) → F8 (join)
    with BuildSketch(Plane.XY.offset(F8_START)):
        Polygon((2.6450336353, -3.6405764747), (4.2797543233, 1.3905764747), (0, 4.5), (-4.2797543233, 1.3905764747), (-2.6450336353, -3.6405764747), align=None)
        Circle(F0_R_3, mode=Mode.SUBTRACT)
    extrude(amount=F8_DEPTH)


with BuildPart() as f9:
    # F0 (on Top) → F9 (new body, two sides)
    with BuildSketch(Plane.XY) as f9_sk:
        with BuildLine():
            Line((-4, 6), (0, 6))
            ThreePointArc((0, 6), (4.2426406871, 4.2426406871), (6, 0))
            Line((6, 0), (6, 5.5275252317))
            Line((6, 5.5275252317), (4.6305157529, 19))
            Line((4.6305157529, 19), (-4.6305157529, 19))
            Line((-4.6305157529, 19), (-6, 5.5275252317))
            Line((-6, 5.5275252317), (-4, 6))
        make_face()
        with BuildLine():
            ThreePointArc((6, 0), (4.2426406871, 4.2426406871), (0, 6))
            ThreePointArc((0, 6), (-4.2426406871, 4.2426406871), (-6, 0))
            ThreePointArc((-6, 0), (-4.2426406871, -4.2426406871), (0, -6))
            ThreePointArc((0, -6), (4.2426406871, -4.2426406871), (6, 0))
        make_face()
        Circle(F0_R, mode=Mode.SUBTRACT)
        Circle(F0_R)
        Circle(F0_R_2, mode=Mode.SUBTRACT)
        Circle(F0_R_2)
        with BuildLine():
            ThreePointArc((4.2797543233, 1.3905764747), (4.4445975327, 0.7039550927), (4.5, 0))
            ThreePointArc((4.5, 0), (4.0095293588, -2.0429572488), (2.6450336353, -3.6405764747))
            ThreePointArc((2.6450336353, -3.6405764747), (0, -4.5), (-2.6450336353, -3.6405764747))
            ThreePointArc((-2.6450336353, -3.6405764747), (-4.2797543233, -1.3905764747), (-4.2797543233, 1.3905764747))
            ThreePointArc((-4.2797543233, 1.3905764747), (-2.6450336353, 3.6405764747), (0, 4.5))
            ThreePointArc((0, 4.5), (2.6450336353, 3.6405764747), (4.2797543233, 1.3905764747))
        make_face(mode=Mode.SUBTRACT)
        with BuildLine():
            Line((-3.9794931225, 25.4045175988), (-4.6305157529, 19))
            Line((-4.6305157529, 19), (4.6305157529, 19))
            Line((4.6305157529, 19), (3.9794931225, 25.4045175988))
            ThreePointArc((3.9794931225, 25.4045175988), (0, 29), (-3.9794931225, 25.4045175988))
        make_face()
        with Locations((0, 25)):
            Circle(F0_R_4, mode=Mode.SUBTRACT)
        with BuildLine():
            ThreePointArc((-6, 0), (-4.2426406871, 4.2426406871), (0, 6))
            Line((0, 6), (-4, 6))
            Line((-4, 6), (-6, 5.5275252317))
            Line((-6, 5.5275252317), (-6, 0))
        make_face()
        with BuildLine():
            ThreePointArc((2.6450336353, -3.6405764747), (4.0095293588, -2.0429572488), (4.5, 0))
            ThreePointArc((4.5, 0), (4.4445975327, 0.7039550927), (4.2797543233, 1.3905764747))
            Line((4.2797543233, 1.3905764747), (2.6450336353, -3.6405764747))
        make_face()
        with BuildLine():
            ThreePointArc((-4.2797543233, 1.3905764747), (-4.2797543233, -1.3905764747), (-2.6450336353, -3.6405764747))
            Line((-2.6450336353, -3.6405764747), (-4.2797543233, 1.3905764747))
        make_face()
        with BuildLine():
            Line((-4.2797543233, 1.3905764747), (0, 4.5))
            ThreePointArc((0, 4.5), (-2.6450336353, 3.6405764747), (-4.2797543233, 1.3905764747))
        make_face()
        with BuildLine():
            ThreePointArc((-2.6450336353, -3.6405764747), (0, -4.5), (2.6450336353, -3.6405764747))
            Line((2.6450336353, -3.6405764747), (-2.6450336353, -3.6405764747))
        make_face()
        with BuildLine():
            Line((0, 4.5), (4.2797543233, 1.3905764747))
            ThreePointArc((4.2797543233, 1.3905764747), (2.6450336353, 3.6405764747), (0, 4.5))
        make_face()
    extrude(amount=F9_DEPTH)
    extrude(f9_sk.sketch, amount=-F9_DEPTH_BACK)

    # F0 (on Top) → F10 (cut)
    with BuildSketch(Plane.XY):
        with BuildLine():
            Line((-3.9794931225, 25.4045175988), (-4.6305157529, 19))
            Line((-4.6305157529, 19), (4.6305157529, 19))
            Line((4.6305157529, 19), (3.9794931225, 25.4045175988))
            ThreePointArc((3.9794931225, 25.4045175988), (0, 29), (-3.9794931225, 25.4045175988))
        make_face()
        with Locations((0, 25)):
            Circle(F0_R_4, mode=Mode.SUBTRACT)
    extrude(amount=F10_DEPTH, mode=Mode.SUBTRACT)


with BuildPart() as f11:
    # F0 (on Top) → F11 (new body, two sides)
    with BuildSketch(Plane.XY) as f11_sk:
        Polygon((2.6450336353, -3.6405764747), (4.2797543233, 1.3905764747), (0, 4.5), (-4.2797543233, 1.3905764747), (-2.6450336353, -3.6405764747), align=None)
        Circle(F0_R_3, mode=Mode.SUBTRACT)
    extrude(amount=F11_DEPTH)
    extrude(f11_sk.sketch, amount=-F11_DEPTH_BACK)

    # F0 (on Top) → F12 (join)
    with BuildSketch(Plane.XY.offset(F12_START)):
        Circle(F0_R_2)
        with BuildLine():
            ThreePointArc((4.2797543233, 1.3905764747), (4.4445975327, 0.7039550927), (4.5, 0))
            ThreePointArc((4.5, 0), (4.0095293588, -2.0429572488), (2.6450336353, -3.6405764747))
            ThreePointArc((2.6450336353, -3.6405764747), (0, -4.5), (-2.6450336353, -3.6405764747))
            ThreePointArc((-2.6450336353, -3.6405764747), (-4.2797543233, -1.3905764747), (-4.2797543233, 1.3905764747))
            ThreePointArc((-4.2797543233, 1.3905764747), (-2.6450336353, 3.6405764747), (0, 4.5))
            ThreePointArc((0, 4.5), (2.6450336353, 3.6405764747), (4.2797543233, 1.3905764747))
        make_face(mode=Mode.SUBTRACT)
        Polygon((2.6450336353, -3.6405764747), (4.2797543233, 1.3905764747), (0, 4.5), (-4.2797543233, 1.3905764747), (-2.6450336353, -3.6405764747), align=None)
        Circle(F0_R_3, mode=Mode.SUBTRACT)
        with BuildLine():
            ThreePointArc((-2.6450336353, -3.6405764747), (0, -4.5), (2.6450336353, -3.6405764747))
            Line((2.6450336353, -3.6405764747), (-2.6450336353, -3.6405764747))
        make_face()
        with BuildLine():
            Line((-4.2797543233, 1.3905764747), (0, 4.5))
            ThreePointArc((0, 4.5), (-2.6450336353, 3.6405764747), (-4.2797543233, 1.3905764747))
        make_face()
        with BuildLine():
            ThreePointArc((-4.2797543233, 1.3905764747), (-4.2797543233, -1.3905764747), (-2.6450336353, -3.6405764747))
            Line((-2.6450336353, -3.6405764747), (-4.2797543233, 1.3905764747))
        make_face()
        with BuildLine():
            Line((0, 4.5), (4.2797543233, 1.3905764747))
            ThreePointArc((4.2797543233, 1.3905764747), (2.6450336353, 3.6405764747), (0, 4.5))
        make_face()
        with BuildLine():
            ThreePointArc((2.6450336353, -3.6405764747), (4.0095293588, -2.0429572488), (4.5, 0))
            ThreePointArc((4.5, 0), (4.4445975327, 0.7039550927), (4.2797543233, 1.3905764747))
            Line((4.2797543233, 1.3905764747), (2.6450336353, -3.6405764747))
        make_face()
    extrude(amount=-F12_DEPTH)

    # F0 (on Top) → F13 (join)
    with BuildSketch(Plane.XY.offset(F13_START)):
        Circle(F0_R)
        Circle(F0_R_2, mode=Mode.SUBTRACT)
    extrude(amount=-F13_DEPTH)


solid = Compound([f1.part, f4.part, f6.part, f9.part, f11.part])
